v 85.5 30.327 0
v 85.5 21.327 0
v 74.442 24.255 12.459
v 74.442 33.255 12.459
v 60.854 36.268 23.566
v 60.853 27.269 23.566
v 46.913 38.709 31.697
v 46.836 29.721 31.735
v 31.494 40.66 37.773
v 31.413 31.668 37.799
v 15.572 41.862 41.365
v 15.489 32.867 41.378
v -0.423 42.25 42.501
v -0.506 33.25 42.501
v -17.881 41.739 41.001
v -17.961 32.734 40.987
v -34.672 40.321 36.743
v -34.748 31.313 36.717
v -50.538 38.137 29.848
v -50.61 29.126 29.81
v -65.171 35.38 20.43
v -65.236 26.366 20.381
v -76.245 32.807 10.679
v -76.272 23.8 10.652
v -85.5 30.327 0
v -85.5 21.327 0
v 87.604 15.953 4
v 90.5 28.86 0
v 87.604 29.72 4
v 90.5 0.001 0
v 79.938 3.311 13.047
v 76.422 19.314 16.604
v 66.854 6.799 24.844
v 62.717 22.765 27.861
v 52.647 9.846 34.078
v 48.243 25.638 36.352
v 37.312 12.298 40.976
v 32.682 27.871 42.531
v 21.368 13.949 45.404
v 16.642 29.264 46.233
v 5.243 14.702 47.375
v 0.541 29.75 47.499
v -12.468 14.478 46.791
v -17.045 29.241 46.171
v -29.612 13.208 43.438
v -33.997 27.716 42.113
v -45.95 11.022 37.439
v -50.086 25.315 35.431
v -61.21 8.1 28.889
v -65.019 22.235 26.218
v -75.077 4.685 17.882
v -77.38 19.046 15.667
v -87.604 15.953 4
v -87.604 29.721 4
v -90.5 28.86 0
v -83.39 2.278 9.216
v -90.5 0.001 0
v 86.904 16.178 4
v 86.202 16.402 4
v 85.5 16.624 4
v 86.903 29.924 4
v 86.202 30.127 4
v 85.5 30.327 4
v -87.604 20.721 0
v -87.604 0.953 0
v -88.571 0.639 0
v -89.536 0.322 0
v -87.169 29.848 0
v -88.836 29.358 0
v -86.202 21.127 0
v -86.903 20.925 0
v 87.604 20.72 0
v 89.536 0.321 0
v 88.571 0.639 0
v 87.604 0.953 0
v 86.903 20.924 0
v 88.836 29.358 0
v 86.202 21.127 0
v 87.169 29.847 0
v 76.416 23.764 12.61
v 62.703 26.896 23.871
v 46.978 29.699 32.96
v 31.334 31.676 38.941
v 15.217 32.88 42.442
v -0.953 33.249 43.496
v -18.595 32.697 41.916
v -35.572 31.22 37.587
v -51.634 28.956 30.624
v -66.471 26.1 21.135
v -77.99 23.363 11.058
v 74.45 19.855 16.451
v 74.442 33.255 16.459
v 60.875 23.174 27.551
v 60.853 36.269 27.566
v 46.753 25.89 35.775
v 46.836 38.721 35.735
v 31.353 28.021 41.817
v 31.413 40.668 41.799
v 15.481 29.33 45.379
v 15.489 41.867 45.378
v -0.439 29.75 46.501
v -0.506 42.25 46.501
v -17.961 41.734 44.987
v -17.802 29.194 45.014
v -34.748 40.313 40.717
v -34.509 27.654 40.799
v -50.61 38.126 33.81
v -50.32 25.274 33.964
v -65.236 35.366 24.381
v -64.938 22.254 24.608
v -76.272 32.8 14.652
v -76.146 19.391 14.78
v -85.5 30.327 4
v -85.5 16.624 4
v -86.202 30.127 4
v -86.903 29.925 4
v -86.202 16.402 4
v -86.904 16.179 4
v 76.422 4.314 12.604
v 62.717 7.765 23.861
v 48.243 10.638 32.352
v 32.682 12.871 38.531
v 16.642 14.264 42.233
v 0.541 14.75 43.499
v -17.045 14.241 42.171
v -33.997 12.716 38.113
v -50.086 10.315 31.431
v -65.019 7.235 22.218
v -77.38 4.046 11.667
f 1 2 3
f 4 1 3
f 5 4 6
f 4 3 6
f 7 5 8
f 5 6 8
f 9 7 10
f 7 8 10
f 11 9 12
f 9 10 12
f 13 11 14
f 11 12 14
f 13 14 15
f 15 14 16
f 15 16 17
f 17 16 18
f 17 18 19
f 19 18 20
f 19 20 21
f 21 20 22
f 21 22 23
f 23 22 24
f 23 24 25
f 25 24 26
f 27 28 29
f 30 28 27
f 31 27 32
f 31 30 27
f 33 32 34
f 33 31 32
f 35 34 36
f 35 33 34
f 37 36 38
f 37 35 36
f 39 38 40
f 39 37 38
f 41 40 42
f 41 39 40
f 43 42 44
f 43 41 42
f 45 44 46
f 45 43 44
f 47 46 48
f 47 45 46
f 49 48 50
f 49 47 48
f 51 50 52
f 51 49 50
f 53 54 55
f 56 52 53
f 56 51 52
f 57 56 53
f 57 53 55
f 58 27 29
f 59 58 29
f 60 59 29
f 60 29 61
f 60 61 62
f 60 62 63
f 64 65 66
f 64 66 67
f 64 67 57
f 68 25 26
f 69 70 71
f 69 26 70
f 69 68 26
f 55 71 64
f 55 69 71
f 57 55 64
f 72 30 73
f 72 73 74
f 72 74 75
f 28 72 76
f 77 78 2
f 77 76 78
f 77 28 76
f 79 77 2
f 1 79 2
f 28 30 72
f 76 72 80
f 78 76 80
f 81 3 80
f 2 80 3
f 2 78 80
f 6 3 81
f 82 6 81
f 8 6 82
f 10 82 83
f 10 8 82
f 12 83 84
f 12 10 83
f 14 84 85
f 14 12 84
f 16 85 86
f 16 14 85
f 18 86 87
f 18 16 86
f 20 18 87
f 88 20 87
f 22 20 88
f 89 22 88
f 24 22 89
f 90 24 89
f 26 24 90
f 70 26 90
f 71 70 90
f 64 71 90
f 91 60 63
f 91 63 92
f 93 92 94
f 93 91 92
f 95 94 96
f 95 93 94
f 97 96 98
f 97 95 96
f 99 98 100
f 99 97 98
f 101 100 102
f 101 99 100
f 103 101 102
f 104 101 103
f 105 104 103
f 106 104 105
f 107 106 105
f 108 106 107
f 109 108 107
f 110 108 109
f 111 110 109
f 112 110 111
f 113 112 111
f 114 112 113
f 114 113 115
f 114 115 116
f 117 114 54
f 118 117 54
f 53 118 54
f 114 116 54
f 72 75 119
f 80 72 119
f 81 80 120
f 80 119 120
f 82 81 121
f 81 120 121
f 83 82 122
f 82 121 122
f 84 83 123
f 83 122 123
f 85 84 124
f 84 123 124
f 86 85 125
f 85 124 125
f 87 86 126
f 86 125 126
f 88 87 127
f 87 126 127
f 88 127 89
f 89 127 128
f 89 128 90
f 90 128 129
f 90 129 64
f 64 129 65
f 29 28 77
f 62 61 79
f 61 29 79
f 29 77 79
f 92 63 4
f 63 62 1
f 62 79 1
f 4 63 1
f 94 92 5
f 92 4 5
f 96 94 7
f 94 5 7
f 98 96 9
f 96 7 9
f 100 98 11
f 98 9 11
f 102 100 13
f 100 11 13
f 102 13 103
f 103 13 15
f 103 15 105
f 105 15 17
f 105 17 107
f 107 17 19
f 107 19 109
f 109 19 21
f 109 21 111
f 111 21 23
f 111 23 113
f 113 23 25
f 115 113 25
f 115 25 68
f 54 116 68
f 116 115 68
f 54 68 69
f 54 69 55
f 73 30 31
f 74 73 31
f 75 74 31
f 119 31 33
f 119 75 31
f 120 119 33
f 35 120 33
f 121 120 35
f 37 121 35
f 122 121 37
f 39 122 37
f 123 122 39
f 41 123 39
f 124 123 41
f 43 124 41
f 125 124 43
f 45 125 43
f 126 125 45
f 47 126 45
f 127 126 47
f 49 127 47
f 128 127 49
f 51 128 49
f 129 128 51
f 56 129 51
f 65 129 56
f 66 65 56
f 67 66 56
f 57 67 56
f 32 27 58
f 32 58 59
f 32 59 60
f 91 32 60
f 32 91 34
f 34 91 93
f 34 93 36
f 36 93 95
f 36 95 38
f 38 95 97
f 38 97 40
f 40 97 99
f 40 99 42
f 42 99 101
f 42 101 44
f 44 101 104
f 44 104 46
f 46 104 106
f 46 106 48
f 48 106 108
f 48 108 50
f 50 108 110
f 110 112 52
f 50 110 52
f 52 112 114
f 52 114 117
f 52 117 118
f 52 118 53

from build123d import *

# Parameters (mm, degrees)
PAD002_DEPTH    = 47.5
POCKET004_DEPTH = 67
POCKET005_DEPTH = 50
PAD001_DEPTH    = 47.5
POCKET002_DEPTH = 67
POCKET003_DEPTH = 50
PAD_DEPTH       = 47.5
POCKET_DEPTH    = 67
POCKET001_DEPTH = 50


with BuildPart() as body002:
    # Sketch006 → Pad002 (new body)
    with BuildSketch(Plane.XY):
        with BuildLine():
            ThreePointArc((90.501517, 0), (-0.00051, 14.750711), (-90.502537, 0))
            Line((-90.502537, 0), (-99.243083, 26.073989))
            ThreePointArc((99.233841, 26.076743), (-0.004846, 42.250711), (-99.243083, 26.073989))
            Line((90.501517, 0), (99.233841, 26.076743))
        make_face()
    extrude(amount=PAD002_DEPTH)

    # Sketch007 → Pocket004 (cut)
    with BuildSketch(Plane.XZ):
        with BuildLine():
            Line((0, 0), (-85.5, 0))
            ThreePointArc((85.5, 0), (0, 42.501931), (-85.5, 0))
            Line((0, 0), (85.5, 0))
        make_face()
    extrude(amount=-POCKET004_DEPTH, mode=Mode.SUBTRACT)

    # Sketch008 → Pocket005 (cut)
    with BuildSketch(Plane.XZ):
        with BuildLine():
            ThreePointArc((90.5, 0), (0, 47.5), (-90.5, 0))
            Line((-90.5, 0), (-105.5, 0))
            Line((-105.5, 0), (-105.5, 50))
            Line((-105.5, 50), (104.5, 50))
            Line((104.5, 50), (104.5, 0))
            Line((90.5, 0), (104.5, 0))
        make_face()
    extrude(amount=-POCKET005_DEPTH, mode=Mode.SUBTRACT)


with BuildPart() as body002_1:
    # Body002 placement: moved
    add(body002.part.moved(Location((0, 15, 4))))


with BuildPart() as body001:
    # Sketch003 → Pad001 (new body)
    with BuildSketch(Plane.XY):
        with BuildLine():
            ThreePointArc((90.501517, 0), (-0.00051, 14.750711), (-90.502537, 0))
            Line((-90.502537, 0), (-99.243083, 26.073989))
            ThreePointArc((99.233841, 26.076743), (-0.004846, 42.250711), (-99.243083, 26.073989))
            Line((90.501517, 0), (99.233841, 26.076743))
        make_face()
    extrude(amount=PAD001_DEPTH)

    # Sketch004 → Pocket002 (cut)
    with BuildSketch(Plane.XZ):
        with BuildLine():
            Line((0, 0), (-85.5, 0))
            ThreePointArc((85.5, 0), (0, 42.501931), (-85.5, 0))
            Line((0, 0), (85.5, 0))
        make_face()
    extrude(amount=-POCKET002_DEPTH, mode=Mode.SUBTRACT)

    # Sketch005 → Pocket003 (cut)
    with BuildSketch(Plane.XZ):
        with BuildLine():
            ThreePointArc((90.5, 0), (0, 47.5), (-90.5, 0))
            Line((-90.5, 0), (-105.5, 0))
            Line((-105.5, 0), (-105.5, 50))
            Line((-105.5, 50), (104.5, 50))
            Line((104.5, 50), (104.5, 0))
            Line((90.5, 0), (104.5, 0))
        make_face()
    extrude(amount=-POCKET003_DEPTH, mode=Mode.SUBTRACT)


with BuildPart() as body001_1:
    # Body001 placement: moved
    add(body001.part.moved(Location((0, -9, -4))))


with BuildPart() as cut001:
    # Sketch → Pad (new body)
    with BuildSketch(Plane.XY):
        with BuildLine():
            ThreePointArc((90.501517, 0), (-0.00051, 14.750711), (-90.502537, 0))
            Line((-90.502537, 0), (-99.243083, 26.073989))
            ThreePointArc((99.233841, 26.076743), (-0.004846, 42.250711), (-99.243083, 26.073989))
            Line((90.501517, 0), (99.233841, 26.076743))
        make_face()
    extrude(amount=PAD_DEPTH)

    # Sketch001 → Pocket (cut)
    with BuildSketch(Plane.XZ):
        with BuildLine():
            Line((0, 0), (-85.5, 0))
            ThreePointArc((85.5, 0), (0, 42.501931), (-85.5, 0))
            Line((0, 0), (85.5, 0))
        make_face()
    extrude(amount=-POCKET_DEPTH, mode=Mode.SUBTRACT)

    # Sketch002 → Pocket001 (cut)
    with BuildSketch(Plane.XZ):
        with BuildLine():
            ThreePointArc((90.5, 0), (0, 47.5), (-90.5, 0))
            Line((-90.5, 0), (-105.5, 0))
            Line((-105.5, 0), (-105.5, 50))
            Line((-105.5, 50), (104.5, 50))
            Line((104.5, 50), (104.5, 0))
            Line((90.5, 0), (104.5, 0))
        make_face()
    extrude(amount=-POCKET001_DEPTH, mode=Mode.SUBTRACT)

    # Cut: cut Body001
    add(body001_1.part, mode=Mode.SUBTRACT)

    # Cut001: cut Body002
    add(body002_1.part, mode=Mode.SUBTRACT)


solid = cut001.part
